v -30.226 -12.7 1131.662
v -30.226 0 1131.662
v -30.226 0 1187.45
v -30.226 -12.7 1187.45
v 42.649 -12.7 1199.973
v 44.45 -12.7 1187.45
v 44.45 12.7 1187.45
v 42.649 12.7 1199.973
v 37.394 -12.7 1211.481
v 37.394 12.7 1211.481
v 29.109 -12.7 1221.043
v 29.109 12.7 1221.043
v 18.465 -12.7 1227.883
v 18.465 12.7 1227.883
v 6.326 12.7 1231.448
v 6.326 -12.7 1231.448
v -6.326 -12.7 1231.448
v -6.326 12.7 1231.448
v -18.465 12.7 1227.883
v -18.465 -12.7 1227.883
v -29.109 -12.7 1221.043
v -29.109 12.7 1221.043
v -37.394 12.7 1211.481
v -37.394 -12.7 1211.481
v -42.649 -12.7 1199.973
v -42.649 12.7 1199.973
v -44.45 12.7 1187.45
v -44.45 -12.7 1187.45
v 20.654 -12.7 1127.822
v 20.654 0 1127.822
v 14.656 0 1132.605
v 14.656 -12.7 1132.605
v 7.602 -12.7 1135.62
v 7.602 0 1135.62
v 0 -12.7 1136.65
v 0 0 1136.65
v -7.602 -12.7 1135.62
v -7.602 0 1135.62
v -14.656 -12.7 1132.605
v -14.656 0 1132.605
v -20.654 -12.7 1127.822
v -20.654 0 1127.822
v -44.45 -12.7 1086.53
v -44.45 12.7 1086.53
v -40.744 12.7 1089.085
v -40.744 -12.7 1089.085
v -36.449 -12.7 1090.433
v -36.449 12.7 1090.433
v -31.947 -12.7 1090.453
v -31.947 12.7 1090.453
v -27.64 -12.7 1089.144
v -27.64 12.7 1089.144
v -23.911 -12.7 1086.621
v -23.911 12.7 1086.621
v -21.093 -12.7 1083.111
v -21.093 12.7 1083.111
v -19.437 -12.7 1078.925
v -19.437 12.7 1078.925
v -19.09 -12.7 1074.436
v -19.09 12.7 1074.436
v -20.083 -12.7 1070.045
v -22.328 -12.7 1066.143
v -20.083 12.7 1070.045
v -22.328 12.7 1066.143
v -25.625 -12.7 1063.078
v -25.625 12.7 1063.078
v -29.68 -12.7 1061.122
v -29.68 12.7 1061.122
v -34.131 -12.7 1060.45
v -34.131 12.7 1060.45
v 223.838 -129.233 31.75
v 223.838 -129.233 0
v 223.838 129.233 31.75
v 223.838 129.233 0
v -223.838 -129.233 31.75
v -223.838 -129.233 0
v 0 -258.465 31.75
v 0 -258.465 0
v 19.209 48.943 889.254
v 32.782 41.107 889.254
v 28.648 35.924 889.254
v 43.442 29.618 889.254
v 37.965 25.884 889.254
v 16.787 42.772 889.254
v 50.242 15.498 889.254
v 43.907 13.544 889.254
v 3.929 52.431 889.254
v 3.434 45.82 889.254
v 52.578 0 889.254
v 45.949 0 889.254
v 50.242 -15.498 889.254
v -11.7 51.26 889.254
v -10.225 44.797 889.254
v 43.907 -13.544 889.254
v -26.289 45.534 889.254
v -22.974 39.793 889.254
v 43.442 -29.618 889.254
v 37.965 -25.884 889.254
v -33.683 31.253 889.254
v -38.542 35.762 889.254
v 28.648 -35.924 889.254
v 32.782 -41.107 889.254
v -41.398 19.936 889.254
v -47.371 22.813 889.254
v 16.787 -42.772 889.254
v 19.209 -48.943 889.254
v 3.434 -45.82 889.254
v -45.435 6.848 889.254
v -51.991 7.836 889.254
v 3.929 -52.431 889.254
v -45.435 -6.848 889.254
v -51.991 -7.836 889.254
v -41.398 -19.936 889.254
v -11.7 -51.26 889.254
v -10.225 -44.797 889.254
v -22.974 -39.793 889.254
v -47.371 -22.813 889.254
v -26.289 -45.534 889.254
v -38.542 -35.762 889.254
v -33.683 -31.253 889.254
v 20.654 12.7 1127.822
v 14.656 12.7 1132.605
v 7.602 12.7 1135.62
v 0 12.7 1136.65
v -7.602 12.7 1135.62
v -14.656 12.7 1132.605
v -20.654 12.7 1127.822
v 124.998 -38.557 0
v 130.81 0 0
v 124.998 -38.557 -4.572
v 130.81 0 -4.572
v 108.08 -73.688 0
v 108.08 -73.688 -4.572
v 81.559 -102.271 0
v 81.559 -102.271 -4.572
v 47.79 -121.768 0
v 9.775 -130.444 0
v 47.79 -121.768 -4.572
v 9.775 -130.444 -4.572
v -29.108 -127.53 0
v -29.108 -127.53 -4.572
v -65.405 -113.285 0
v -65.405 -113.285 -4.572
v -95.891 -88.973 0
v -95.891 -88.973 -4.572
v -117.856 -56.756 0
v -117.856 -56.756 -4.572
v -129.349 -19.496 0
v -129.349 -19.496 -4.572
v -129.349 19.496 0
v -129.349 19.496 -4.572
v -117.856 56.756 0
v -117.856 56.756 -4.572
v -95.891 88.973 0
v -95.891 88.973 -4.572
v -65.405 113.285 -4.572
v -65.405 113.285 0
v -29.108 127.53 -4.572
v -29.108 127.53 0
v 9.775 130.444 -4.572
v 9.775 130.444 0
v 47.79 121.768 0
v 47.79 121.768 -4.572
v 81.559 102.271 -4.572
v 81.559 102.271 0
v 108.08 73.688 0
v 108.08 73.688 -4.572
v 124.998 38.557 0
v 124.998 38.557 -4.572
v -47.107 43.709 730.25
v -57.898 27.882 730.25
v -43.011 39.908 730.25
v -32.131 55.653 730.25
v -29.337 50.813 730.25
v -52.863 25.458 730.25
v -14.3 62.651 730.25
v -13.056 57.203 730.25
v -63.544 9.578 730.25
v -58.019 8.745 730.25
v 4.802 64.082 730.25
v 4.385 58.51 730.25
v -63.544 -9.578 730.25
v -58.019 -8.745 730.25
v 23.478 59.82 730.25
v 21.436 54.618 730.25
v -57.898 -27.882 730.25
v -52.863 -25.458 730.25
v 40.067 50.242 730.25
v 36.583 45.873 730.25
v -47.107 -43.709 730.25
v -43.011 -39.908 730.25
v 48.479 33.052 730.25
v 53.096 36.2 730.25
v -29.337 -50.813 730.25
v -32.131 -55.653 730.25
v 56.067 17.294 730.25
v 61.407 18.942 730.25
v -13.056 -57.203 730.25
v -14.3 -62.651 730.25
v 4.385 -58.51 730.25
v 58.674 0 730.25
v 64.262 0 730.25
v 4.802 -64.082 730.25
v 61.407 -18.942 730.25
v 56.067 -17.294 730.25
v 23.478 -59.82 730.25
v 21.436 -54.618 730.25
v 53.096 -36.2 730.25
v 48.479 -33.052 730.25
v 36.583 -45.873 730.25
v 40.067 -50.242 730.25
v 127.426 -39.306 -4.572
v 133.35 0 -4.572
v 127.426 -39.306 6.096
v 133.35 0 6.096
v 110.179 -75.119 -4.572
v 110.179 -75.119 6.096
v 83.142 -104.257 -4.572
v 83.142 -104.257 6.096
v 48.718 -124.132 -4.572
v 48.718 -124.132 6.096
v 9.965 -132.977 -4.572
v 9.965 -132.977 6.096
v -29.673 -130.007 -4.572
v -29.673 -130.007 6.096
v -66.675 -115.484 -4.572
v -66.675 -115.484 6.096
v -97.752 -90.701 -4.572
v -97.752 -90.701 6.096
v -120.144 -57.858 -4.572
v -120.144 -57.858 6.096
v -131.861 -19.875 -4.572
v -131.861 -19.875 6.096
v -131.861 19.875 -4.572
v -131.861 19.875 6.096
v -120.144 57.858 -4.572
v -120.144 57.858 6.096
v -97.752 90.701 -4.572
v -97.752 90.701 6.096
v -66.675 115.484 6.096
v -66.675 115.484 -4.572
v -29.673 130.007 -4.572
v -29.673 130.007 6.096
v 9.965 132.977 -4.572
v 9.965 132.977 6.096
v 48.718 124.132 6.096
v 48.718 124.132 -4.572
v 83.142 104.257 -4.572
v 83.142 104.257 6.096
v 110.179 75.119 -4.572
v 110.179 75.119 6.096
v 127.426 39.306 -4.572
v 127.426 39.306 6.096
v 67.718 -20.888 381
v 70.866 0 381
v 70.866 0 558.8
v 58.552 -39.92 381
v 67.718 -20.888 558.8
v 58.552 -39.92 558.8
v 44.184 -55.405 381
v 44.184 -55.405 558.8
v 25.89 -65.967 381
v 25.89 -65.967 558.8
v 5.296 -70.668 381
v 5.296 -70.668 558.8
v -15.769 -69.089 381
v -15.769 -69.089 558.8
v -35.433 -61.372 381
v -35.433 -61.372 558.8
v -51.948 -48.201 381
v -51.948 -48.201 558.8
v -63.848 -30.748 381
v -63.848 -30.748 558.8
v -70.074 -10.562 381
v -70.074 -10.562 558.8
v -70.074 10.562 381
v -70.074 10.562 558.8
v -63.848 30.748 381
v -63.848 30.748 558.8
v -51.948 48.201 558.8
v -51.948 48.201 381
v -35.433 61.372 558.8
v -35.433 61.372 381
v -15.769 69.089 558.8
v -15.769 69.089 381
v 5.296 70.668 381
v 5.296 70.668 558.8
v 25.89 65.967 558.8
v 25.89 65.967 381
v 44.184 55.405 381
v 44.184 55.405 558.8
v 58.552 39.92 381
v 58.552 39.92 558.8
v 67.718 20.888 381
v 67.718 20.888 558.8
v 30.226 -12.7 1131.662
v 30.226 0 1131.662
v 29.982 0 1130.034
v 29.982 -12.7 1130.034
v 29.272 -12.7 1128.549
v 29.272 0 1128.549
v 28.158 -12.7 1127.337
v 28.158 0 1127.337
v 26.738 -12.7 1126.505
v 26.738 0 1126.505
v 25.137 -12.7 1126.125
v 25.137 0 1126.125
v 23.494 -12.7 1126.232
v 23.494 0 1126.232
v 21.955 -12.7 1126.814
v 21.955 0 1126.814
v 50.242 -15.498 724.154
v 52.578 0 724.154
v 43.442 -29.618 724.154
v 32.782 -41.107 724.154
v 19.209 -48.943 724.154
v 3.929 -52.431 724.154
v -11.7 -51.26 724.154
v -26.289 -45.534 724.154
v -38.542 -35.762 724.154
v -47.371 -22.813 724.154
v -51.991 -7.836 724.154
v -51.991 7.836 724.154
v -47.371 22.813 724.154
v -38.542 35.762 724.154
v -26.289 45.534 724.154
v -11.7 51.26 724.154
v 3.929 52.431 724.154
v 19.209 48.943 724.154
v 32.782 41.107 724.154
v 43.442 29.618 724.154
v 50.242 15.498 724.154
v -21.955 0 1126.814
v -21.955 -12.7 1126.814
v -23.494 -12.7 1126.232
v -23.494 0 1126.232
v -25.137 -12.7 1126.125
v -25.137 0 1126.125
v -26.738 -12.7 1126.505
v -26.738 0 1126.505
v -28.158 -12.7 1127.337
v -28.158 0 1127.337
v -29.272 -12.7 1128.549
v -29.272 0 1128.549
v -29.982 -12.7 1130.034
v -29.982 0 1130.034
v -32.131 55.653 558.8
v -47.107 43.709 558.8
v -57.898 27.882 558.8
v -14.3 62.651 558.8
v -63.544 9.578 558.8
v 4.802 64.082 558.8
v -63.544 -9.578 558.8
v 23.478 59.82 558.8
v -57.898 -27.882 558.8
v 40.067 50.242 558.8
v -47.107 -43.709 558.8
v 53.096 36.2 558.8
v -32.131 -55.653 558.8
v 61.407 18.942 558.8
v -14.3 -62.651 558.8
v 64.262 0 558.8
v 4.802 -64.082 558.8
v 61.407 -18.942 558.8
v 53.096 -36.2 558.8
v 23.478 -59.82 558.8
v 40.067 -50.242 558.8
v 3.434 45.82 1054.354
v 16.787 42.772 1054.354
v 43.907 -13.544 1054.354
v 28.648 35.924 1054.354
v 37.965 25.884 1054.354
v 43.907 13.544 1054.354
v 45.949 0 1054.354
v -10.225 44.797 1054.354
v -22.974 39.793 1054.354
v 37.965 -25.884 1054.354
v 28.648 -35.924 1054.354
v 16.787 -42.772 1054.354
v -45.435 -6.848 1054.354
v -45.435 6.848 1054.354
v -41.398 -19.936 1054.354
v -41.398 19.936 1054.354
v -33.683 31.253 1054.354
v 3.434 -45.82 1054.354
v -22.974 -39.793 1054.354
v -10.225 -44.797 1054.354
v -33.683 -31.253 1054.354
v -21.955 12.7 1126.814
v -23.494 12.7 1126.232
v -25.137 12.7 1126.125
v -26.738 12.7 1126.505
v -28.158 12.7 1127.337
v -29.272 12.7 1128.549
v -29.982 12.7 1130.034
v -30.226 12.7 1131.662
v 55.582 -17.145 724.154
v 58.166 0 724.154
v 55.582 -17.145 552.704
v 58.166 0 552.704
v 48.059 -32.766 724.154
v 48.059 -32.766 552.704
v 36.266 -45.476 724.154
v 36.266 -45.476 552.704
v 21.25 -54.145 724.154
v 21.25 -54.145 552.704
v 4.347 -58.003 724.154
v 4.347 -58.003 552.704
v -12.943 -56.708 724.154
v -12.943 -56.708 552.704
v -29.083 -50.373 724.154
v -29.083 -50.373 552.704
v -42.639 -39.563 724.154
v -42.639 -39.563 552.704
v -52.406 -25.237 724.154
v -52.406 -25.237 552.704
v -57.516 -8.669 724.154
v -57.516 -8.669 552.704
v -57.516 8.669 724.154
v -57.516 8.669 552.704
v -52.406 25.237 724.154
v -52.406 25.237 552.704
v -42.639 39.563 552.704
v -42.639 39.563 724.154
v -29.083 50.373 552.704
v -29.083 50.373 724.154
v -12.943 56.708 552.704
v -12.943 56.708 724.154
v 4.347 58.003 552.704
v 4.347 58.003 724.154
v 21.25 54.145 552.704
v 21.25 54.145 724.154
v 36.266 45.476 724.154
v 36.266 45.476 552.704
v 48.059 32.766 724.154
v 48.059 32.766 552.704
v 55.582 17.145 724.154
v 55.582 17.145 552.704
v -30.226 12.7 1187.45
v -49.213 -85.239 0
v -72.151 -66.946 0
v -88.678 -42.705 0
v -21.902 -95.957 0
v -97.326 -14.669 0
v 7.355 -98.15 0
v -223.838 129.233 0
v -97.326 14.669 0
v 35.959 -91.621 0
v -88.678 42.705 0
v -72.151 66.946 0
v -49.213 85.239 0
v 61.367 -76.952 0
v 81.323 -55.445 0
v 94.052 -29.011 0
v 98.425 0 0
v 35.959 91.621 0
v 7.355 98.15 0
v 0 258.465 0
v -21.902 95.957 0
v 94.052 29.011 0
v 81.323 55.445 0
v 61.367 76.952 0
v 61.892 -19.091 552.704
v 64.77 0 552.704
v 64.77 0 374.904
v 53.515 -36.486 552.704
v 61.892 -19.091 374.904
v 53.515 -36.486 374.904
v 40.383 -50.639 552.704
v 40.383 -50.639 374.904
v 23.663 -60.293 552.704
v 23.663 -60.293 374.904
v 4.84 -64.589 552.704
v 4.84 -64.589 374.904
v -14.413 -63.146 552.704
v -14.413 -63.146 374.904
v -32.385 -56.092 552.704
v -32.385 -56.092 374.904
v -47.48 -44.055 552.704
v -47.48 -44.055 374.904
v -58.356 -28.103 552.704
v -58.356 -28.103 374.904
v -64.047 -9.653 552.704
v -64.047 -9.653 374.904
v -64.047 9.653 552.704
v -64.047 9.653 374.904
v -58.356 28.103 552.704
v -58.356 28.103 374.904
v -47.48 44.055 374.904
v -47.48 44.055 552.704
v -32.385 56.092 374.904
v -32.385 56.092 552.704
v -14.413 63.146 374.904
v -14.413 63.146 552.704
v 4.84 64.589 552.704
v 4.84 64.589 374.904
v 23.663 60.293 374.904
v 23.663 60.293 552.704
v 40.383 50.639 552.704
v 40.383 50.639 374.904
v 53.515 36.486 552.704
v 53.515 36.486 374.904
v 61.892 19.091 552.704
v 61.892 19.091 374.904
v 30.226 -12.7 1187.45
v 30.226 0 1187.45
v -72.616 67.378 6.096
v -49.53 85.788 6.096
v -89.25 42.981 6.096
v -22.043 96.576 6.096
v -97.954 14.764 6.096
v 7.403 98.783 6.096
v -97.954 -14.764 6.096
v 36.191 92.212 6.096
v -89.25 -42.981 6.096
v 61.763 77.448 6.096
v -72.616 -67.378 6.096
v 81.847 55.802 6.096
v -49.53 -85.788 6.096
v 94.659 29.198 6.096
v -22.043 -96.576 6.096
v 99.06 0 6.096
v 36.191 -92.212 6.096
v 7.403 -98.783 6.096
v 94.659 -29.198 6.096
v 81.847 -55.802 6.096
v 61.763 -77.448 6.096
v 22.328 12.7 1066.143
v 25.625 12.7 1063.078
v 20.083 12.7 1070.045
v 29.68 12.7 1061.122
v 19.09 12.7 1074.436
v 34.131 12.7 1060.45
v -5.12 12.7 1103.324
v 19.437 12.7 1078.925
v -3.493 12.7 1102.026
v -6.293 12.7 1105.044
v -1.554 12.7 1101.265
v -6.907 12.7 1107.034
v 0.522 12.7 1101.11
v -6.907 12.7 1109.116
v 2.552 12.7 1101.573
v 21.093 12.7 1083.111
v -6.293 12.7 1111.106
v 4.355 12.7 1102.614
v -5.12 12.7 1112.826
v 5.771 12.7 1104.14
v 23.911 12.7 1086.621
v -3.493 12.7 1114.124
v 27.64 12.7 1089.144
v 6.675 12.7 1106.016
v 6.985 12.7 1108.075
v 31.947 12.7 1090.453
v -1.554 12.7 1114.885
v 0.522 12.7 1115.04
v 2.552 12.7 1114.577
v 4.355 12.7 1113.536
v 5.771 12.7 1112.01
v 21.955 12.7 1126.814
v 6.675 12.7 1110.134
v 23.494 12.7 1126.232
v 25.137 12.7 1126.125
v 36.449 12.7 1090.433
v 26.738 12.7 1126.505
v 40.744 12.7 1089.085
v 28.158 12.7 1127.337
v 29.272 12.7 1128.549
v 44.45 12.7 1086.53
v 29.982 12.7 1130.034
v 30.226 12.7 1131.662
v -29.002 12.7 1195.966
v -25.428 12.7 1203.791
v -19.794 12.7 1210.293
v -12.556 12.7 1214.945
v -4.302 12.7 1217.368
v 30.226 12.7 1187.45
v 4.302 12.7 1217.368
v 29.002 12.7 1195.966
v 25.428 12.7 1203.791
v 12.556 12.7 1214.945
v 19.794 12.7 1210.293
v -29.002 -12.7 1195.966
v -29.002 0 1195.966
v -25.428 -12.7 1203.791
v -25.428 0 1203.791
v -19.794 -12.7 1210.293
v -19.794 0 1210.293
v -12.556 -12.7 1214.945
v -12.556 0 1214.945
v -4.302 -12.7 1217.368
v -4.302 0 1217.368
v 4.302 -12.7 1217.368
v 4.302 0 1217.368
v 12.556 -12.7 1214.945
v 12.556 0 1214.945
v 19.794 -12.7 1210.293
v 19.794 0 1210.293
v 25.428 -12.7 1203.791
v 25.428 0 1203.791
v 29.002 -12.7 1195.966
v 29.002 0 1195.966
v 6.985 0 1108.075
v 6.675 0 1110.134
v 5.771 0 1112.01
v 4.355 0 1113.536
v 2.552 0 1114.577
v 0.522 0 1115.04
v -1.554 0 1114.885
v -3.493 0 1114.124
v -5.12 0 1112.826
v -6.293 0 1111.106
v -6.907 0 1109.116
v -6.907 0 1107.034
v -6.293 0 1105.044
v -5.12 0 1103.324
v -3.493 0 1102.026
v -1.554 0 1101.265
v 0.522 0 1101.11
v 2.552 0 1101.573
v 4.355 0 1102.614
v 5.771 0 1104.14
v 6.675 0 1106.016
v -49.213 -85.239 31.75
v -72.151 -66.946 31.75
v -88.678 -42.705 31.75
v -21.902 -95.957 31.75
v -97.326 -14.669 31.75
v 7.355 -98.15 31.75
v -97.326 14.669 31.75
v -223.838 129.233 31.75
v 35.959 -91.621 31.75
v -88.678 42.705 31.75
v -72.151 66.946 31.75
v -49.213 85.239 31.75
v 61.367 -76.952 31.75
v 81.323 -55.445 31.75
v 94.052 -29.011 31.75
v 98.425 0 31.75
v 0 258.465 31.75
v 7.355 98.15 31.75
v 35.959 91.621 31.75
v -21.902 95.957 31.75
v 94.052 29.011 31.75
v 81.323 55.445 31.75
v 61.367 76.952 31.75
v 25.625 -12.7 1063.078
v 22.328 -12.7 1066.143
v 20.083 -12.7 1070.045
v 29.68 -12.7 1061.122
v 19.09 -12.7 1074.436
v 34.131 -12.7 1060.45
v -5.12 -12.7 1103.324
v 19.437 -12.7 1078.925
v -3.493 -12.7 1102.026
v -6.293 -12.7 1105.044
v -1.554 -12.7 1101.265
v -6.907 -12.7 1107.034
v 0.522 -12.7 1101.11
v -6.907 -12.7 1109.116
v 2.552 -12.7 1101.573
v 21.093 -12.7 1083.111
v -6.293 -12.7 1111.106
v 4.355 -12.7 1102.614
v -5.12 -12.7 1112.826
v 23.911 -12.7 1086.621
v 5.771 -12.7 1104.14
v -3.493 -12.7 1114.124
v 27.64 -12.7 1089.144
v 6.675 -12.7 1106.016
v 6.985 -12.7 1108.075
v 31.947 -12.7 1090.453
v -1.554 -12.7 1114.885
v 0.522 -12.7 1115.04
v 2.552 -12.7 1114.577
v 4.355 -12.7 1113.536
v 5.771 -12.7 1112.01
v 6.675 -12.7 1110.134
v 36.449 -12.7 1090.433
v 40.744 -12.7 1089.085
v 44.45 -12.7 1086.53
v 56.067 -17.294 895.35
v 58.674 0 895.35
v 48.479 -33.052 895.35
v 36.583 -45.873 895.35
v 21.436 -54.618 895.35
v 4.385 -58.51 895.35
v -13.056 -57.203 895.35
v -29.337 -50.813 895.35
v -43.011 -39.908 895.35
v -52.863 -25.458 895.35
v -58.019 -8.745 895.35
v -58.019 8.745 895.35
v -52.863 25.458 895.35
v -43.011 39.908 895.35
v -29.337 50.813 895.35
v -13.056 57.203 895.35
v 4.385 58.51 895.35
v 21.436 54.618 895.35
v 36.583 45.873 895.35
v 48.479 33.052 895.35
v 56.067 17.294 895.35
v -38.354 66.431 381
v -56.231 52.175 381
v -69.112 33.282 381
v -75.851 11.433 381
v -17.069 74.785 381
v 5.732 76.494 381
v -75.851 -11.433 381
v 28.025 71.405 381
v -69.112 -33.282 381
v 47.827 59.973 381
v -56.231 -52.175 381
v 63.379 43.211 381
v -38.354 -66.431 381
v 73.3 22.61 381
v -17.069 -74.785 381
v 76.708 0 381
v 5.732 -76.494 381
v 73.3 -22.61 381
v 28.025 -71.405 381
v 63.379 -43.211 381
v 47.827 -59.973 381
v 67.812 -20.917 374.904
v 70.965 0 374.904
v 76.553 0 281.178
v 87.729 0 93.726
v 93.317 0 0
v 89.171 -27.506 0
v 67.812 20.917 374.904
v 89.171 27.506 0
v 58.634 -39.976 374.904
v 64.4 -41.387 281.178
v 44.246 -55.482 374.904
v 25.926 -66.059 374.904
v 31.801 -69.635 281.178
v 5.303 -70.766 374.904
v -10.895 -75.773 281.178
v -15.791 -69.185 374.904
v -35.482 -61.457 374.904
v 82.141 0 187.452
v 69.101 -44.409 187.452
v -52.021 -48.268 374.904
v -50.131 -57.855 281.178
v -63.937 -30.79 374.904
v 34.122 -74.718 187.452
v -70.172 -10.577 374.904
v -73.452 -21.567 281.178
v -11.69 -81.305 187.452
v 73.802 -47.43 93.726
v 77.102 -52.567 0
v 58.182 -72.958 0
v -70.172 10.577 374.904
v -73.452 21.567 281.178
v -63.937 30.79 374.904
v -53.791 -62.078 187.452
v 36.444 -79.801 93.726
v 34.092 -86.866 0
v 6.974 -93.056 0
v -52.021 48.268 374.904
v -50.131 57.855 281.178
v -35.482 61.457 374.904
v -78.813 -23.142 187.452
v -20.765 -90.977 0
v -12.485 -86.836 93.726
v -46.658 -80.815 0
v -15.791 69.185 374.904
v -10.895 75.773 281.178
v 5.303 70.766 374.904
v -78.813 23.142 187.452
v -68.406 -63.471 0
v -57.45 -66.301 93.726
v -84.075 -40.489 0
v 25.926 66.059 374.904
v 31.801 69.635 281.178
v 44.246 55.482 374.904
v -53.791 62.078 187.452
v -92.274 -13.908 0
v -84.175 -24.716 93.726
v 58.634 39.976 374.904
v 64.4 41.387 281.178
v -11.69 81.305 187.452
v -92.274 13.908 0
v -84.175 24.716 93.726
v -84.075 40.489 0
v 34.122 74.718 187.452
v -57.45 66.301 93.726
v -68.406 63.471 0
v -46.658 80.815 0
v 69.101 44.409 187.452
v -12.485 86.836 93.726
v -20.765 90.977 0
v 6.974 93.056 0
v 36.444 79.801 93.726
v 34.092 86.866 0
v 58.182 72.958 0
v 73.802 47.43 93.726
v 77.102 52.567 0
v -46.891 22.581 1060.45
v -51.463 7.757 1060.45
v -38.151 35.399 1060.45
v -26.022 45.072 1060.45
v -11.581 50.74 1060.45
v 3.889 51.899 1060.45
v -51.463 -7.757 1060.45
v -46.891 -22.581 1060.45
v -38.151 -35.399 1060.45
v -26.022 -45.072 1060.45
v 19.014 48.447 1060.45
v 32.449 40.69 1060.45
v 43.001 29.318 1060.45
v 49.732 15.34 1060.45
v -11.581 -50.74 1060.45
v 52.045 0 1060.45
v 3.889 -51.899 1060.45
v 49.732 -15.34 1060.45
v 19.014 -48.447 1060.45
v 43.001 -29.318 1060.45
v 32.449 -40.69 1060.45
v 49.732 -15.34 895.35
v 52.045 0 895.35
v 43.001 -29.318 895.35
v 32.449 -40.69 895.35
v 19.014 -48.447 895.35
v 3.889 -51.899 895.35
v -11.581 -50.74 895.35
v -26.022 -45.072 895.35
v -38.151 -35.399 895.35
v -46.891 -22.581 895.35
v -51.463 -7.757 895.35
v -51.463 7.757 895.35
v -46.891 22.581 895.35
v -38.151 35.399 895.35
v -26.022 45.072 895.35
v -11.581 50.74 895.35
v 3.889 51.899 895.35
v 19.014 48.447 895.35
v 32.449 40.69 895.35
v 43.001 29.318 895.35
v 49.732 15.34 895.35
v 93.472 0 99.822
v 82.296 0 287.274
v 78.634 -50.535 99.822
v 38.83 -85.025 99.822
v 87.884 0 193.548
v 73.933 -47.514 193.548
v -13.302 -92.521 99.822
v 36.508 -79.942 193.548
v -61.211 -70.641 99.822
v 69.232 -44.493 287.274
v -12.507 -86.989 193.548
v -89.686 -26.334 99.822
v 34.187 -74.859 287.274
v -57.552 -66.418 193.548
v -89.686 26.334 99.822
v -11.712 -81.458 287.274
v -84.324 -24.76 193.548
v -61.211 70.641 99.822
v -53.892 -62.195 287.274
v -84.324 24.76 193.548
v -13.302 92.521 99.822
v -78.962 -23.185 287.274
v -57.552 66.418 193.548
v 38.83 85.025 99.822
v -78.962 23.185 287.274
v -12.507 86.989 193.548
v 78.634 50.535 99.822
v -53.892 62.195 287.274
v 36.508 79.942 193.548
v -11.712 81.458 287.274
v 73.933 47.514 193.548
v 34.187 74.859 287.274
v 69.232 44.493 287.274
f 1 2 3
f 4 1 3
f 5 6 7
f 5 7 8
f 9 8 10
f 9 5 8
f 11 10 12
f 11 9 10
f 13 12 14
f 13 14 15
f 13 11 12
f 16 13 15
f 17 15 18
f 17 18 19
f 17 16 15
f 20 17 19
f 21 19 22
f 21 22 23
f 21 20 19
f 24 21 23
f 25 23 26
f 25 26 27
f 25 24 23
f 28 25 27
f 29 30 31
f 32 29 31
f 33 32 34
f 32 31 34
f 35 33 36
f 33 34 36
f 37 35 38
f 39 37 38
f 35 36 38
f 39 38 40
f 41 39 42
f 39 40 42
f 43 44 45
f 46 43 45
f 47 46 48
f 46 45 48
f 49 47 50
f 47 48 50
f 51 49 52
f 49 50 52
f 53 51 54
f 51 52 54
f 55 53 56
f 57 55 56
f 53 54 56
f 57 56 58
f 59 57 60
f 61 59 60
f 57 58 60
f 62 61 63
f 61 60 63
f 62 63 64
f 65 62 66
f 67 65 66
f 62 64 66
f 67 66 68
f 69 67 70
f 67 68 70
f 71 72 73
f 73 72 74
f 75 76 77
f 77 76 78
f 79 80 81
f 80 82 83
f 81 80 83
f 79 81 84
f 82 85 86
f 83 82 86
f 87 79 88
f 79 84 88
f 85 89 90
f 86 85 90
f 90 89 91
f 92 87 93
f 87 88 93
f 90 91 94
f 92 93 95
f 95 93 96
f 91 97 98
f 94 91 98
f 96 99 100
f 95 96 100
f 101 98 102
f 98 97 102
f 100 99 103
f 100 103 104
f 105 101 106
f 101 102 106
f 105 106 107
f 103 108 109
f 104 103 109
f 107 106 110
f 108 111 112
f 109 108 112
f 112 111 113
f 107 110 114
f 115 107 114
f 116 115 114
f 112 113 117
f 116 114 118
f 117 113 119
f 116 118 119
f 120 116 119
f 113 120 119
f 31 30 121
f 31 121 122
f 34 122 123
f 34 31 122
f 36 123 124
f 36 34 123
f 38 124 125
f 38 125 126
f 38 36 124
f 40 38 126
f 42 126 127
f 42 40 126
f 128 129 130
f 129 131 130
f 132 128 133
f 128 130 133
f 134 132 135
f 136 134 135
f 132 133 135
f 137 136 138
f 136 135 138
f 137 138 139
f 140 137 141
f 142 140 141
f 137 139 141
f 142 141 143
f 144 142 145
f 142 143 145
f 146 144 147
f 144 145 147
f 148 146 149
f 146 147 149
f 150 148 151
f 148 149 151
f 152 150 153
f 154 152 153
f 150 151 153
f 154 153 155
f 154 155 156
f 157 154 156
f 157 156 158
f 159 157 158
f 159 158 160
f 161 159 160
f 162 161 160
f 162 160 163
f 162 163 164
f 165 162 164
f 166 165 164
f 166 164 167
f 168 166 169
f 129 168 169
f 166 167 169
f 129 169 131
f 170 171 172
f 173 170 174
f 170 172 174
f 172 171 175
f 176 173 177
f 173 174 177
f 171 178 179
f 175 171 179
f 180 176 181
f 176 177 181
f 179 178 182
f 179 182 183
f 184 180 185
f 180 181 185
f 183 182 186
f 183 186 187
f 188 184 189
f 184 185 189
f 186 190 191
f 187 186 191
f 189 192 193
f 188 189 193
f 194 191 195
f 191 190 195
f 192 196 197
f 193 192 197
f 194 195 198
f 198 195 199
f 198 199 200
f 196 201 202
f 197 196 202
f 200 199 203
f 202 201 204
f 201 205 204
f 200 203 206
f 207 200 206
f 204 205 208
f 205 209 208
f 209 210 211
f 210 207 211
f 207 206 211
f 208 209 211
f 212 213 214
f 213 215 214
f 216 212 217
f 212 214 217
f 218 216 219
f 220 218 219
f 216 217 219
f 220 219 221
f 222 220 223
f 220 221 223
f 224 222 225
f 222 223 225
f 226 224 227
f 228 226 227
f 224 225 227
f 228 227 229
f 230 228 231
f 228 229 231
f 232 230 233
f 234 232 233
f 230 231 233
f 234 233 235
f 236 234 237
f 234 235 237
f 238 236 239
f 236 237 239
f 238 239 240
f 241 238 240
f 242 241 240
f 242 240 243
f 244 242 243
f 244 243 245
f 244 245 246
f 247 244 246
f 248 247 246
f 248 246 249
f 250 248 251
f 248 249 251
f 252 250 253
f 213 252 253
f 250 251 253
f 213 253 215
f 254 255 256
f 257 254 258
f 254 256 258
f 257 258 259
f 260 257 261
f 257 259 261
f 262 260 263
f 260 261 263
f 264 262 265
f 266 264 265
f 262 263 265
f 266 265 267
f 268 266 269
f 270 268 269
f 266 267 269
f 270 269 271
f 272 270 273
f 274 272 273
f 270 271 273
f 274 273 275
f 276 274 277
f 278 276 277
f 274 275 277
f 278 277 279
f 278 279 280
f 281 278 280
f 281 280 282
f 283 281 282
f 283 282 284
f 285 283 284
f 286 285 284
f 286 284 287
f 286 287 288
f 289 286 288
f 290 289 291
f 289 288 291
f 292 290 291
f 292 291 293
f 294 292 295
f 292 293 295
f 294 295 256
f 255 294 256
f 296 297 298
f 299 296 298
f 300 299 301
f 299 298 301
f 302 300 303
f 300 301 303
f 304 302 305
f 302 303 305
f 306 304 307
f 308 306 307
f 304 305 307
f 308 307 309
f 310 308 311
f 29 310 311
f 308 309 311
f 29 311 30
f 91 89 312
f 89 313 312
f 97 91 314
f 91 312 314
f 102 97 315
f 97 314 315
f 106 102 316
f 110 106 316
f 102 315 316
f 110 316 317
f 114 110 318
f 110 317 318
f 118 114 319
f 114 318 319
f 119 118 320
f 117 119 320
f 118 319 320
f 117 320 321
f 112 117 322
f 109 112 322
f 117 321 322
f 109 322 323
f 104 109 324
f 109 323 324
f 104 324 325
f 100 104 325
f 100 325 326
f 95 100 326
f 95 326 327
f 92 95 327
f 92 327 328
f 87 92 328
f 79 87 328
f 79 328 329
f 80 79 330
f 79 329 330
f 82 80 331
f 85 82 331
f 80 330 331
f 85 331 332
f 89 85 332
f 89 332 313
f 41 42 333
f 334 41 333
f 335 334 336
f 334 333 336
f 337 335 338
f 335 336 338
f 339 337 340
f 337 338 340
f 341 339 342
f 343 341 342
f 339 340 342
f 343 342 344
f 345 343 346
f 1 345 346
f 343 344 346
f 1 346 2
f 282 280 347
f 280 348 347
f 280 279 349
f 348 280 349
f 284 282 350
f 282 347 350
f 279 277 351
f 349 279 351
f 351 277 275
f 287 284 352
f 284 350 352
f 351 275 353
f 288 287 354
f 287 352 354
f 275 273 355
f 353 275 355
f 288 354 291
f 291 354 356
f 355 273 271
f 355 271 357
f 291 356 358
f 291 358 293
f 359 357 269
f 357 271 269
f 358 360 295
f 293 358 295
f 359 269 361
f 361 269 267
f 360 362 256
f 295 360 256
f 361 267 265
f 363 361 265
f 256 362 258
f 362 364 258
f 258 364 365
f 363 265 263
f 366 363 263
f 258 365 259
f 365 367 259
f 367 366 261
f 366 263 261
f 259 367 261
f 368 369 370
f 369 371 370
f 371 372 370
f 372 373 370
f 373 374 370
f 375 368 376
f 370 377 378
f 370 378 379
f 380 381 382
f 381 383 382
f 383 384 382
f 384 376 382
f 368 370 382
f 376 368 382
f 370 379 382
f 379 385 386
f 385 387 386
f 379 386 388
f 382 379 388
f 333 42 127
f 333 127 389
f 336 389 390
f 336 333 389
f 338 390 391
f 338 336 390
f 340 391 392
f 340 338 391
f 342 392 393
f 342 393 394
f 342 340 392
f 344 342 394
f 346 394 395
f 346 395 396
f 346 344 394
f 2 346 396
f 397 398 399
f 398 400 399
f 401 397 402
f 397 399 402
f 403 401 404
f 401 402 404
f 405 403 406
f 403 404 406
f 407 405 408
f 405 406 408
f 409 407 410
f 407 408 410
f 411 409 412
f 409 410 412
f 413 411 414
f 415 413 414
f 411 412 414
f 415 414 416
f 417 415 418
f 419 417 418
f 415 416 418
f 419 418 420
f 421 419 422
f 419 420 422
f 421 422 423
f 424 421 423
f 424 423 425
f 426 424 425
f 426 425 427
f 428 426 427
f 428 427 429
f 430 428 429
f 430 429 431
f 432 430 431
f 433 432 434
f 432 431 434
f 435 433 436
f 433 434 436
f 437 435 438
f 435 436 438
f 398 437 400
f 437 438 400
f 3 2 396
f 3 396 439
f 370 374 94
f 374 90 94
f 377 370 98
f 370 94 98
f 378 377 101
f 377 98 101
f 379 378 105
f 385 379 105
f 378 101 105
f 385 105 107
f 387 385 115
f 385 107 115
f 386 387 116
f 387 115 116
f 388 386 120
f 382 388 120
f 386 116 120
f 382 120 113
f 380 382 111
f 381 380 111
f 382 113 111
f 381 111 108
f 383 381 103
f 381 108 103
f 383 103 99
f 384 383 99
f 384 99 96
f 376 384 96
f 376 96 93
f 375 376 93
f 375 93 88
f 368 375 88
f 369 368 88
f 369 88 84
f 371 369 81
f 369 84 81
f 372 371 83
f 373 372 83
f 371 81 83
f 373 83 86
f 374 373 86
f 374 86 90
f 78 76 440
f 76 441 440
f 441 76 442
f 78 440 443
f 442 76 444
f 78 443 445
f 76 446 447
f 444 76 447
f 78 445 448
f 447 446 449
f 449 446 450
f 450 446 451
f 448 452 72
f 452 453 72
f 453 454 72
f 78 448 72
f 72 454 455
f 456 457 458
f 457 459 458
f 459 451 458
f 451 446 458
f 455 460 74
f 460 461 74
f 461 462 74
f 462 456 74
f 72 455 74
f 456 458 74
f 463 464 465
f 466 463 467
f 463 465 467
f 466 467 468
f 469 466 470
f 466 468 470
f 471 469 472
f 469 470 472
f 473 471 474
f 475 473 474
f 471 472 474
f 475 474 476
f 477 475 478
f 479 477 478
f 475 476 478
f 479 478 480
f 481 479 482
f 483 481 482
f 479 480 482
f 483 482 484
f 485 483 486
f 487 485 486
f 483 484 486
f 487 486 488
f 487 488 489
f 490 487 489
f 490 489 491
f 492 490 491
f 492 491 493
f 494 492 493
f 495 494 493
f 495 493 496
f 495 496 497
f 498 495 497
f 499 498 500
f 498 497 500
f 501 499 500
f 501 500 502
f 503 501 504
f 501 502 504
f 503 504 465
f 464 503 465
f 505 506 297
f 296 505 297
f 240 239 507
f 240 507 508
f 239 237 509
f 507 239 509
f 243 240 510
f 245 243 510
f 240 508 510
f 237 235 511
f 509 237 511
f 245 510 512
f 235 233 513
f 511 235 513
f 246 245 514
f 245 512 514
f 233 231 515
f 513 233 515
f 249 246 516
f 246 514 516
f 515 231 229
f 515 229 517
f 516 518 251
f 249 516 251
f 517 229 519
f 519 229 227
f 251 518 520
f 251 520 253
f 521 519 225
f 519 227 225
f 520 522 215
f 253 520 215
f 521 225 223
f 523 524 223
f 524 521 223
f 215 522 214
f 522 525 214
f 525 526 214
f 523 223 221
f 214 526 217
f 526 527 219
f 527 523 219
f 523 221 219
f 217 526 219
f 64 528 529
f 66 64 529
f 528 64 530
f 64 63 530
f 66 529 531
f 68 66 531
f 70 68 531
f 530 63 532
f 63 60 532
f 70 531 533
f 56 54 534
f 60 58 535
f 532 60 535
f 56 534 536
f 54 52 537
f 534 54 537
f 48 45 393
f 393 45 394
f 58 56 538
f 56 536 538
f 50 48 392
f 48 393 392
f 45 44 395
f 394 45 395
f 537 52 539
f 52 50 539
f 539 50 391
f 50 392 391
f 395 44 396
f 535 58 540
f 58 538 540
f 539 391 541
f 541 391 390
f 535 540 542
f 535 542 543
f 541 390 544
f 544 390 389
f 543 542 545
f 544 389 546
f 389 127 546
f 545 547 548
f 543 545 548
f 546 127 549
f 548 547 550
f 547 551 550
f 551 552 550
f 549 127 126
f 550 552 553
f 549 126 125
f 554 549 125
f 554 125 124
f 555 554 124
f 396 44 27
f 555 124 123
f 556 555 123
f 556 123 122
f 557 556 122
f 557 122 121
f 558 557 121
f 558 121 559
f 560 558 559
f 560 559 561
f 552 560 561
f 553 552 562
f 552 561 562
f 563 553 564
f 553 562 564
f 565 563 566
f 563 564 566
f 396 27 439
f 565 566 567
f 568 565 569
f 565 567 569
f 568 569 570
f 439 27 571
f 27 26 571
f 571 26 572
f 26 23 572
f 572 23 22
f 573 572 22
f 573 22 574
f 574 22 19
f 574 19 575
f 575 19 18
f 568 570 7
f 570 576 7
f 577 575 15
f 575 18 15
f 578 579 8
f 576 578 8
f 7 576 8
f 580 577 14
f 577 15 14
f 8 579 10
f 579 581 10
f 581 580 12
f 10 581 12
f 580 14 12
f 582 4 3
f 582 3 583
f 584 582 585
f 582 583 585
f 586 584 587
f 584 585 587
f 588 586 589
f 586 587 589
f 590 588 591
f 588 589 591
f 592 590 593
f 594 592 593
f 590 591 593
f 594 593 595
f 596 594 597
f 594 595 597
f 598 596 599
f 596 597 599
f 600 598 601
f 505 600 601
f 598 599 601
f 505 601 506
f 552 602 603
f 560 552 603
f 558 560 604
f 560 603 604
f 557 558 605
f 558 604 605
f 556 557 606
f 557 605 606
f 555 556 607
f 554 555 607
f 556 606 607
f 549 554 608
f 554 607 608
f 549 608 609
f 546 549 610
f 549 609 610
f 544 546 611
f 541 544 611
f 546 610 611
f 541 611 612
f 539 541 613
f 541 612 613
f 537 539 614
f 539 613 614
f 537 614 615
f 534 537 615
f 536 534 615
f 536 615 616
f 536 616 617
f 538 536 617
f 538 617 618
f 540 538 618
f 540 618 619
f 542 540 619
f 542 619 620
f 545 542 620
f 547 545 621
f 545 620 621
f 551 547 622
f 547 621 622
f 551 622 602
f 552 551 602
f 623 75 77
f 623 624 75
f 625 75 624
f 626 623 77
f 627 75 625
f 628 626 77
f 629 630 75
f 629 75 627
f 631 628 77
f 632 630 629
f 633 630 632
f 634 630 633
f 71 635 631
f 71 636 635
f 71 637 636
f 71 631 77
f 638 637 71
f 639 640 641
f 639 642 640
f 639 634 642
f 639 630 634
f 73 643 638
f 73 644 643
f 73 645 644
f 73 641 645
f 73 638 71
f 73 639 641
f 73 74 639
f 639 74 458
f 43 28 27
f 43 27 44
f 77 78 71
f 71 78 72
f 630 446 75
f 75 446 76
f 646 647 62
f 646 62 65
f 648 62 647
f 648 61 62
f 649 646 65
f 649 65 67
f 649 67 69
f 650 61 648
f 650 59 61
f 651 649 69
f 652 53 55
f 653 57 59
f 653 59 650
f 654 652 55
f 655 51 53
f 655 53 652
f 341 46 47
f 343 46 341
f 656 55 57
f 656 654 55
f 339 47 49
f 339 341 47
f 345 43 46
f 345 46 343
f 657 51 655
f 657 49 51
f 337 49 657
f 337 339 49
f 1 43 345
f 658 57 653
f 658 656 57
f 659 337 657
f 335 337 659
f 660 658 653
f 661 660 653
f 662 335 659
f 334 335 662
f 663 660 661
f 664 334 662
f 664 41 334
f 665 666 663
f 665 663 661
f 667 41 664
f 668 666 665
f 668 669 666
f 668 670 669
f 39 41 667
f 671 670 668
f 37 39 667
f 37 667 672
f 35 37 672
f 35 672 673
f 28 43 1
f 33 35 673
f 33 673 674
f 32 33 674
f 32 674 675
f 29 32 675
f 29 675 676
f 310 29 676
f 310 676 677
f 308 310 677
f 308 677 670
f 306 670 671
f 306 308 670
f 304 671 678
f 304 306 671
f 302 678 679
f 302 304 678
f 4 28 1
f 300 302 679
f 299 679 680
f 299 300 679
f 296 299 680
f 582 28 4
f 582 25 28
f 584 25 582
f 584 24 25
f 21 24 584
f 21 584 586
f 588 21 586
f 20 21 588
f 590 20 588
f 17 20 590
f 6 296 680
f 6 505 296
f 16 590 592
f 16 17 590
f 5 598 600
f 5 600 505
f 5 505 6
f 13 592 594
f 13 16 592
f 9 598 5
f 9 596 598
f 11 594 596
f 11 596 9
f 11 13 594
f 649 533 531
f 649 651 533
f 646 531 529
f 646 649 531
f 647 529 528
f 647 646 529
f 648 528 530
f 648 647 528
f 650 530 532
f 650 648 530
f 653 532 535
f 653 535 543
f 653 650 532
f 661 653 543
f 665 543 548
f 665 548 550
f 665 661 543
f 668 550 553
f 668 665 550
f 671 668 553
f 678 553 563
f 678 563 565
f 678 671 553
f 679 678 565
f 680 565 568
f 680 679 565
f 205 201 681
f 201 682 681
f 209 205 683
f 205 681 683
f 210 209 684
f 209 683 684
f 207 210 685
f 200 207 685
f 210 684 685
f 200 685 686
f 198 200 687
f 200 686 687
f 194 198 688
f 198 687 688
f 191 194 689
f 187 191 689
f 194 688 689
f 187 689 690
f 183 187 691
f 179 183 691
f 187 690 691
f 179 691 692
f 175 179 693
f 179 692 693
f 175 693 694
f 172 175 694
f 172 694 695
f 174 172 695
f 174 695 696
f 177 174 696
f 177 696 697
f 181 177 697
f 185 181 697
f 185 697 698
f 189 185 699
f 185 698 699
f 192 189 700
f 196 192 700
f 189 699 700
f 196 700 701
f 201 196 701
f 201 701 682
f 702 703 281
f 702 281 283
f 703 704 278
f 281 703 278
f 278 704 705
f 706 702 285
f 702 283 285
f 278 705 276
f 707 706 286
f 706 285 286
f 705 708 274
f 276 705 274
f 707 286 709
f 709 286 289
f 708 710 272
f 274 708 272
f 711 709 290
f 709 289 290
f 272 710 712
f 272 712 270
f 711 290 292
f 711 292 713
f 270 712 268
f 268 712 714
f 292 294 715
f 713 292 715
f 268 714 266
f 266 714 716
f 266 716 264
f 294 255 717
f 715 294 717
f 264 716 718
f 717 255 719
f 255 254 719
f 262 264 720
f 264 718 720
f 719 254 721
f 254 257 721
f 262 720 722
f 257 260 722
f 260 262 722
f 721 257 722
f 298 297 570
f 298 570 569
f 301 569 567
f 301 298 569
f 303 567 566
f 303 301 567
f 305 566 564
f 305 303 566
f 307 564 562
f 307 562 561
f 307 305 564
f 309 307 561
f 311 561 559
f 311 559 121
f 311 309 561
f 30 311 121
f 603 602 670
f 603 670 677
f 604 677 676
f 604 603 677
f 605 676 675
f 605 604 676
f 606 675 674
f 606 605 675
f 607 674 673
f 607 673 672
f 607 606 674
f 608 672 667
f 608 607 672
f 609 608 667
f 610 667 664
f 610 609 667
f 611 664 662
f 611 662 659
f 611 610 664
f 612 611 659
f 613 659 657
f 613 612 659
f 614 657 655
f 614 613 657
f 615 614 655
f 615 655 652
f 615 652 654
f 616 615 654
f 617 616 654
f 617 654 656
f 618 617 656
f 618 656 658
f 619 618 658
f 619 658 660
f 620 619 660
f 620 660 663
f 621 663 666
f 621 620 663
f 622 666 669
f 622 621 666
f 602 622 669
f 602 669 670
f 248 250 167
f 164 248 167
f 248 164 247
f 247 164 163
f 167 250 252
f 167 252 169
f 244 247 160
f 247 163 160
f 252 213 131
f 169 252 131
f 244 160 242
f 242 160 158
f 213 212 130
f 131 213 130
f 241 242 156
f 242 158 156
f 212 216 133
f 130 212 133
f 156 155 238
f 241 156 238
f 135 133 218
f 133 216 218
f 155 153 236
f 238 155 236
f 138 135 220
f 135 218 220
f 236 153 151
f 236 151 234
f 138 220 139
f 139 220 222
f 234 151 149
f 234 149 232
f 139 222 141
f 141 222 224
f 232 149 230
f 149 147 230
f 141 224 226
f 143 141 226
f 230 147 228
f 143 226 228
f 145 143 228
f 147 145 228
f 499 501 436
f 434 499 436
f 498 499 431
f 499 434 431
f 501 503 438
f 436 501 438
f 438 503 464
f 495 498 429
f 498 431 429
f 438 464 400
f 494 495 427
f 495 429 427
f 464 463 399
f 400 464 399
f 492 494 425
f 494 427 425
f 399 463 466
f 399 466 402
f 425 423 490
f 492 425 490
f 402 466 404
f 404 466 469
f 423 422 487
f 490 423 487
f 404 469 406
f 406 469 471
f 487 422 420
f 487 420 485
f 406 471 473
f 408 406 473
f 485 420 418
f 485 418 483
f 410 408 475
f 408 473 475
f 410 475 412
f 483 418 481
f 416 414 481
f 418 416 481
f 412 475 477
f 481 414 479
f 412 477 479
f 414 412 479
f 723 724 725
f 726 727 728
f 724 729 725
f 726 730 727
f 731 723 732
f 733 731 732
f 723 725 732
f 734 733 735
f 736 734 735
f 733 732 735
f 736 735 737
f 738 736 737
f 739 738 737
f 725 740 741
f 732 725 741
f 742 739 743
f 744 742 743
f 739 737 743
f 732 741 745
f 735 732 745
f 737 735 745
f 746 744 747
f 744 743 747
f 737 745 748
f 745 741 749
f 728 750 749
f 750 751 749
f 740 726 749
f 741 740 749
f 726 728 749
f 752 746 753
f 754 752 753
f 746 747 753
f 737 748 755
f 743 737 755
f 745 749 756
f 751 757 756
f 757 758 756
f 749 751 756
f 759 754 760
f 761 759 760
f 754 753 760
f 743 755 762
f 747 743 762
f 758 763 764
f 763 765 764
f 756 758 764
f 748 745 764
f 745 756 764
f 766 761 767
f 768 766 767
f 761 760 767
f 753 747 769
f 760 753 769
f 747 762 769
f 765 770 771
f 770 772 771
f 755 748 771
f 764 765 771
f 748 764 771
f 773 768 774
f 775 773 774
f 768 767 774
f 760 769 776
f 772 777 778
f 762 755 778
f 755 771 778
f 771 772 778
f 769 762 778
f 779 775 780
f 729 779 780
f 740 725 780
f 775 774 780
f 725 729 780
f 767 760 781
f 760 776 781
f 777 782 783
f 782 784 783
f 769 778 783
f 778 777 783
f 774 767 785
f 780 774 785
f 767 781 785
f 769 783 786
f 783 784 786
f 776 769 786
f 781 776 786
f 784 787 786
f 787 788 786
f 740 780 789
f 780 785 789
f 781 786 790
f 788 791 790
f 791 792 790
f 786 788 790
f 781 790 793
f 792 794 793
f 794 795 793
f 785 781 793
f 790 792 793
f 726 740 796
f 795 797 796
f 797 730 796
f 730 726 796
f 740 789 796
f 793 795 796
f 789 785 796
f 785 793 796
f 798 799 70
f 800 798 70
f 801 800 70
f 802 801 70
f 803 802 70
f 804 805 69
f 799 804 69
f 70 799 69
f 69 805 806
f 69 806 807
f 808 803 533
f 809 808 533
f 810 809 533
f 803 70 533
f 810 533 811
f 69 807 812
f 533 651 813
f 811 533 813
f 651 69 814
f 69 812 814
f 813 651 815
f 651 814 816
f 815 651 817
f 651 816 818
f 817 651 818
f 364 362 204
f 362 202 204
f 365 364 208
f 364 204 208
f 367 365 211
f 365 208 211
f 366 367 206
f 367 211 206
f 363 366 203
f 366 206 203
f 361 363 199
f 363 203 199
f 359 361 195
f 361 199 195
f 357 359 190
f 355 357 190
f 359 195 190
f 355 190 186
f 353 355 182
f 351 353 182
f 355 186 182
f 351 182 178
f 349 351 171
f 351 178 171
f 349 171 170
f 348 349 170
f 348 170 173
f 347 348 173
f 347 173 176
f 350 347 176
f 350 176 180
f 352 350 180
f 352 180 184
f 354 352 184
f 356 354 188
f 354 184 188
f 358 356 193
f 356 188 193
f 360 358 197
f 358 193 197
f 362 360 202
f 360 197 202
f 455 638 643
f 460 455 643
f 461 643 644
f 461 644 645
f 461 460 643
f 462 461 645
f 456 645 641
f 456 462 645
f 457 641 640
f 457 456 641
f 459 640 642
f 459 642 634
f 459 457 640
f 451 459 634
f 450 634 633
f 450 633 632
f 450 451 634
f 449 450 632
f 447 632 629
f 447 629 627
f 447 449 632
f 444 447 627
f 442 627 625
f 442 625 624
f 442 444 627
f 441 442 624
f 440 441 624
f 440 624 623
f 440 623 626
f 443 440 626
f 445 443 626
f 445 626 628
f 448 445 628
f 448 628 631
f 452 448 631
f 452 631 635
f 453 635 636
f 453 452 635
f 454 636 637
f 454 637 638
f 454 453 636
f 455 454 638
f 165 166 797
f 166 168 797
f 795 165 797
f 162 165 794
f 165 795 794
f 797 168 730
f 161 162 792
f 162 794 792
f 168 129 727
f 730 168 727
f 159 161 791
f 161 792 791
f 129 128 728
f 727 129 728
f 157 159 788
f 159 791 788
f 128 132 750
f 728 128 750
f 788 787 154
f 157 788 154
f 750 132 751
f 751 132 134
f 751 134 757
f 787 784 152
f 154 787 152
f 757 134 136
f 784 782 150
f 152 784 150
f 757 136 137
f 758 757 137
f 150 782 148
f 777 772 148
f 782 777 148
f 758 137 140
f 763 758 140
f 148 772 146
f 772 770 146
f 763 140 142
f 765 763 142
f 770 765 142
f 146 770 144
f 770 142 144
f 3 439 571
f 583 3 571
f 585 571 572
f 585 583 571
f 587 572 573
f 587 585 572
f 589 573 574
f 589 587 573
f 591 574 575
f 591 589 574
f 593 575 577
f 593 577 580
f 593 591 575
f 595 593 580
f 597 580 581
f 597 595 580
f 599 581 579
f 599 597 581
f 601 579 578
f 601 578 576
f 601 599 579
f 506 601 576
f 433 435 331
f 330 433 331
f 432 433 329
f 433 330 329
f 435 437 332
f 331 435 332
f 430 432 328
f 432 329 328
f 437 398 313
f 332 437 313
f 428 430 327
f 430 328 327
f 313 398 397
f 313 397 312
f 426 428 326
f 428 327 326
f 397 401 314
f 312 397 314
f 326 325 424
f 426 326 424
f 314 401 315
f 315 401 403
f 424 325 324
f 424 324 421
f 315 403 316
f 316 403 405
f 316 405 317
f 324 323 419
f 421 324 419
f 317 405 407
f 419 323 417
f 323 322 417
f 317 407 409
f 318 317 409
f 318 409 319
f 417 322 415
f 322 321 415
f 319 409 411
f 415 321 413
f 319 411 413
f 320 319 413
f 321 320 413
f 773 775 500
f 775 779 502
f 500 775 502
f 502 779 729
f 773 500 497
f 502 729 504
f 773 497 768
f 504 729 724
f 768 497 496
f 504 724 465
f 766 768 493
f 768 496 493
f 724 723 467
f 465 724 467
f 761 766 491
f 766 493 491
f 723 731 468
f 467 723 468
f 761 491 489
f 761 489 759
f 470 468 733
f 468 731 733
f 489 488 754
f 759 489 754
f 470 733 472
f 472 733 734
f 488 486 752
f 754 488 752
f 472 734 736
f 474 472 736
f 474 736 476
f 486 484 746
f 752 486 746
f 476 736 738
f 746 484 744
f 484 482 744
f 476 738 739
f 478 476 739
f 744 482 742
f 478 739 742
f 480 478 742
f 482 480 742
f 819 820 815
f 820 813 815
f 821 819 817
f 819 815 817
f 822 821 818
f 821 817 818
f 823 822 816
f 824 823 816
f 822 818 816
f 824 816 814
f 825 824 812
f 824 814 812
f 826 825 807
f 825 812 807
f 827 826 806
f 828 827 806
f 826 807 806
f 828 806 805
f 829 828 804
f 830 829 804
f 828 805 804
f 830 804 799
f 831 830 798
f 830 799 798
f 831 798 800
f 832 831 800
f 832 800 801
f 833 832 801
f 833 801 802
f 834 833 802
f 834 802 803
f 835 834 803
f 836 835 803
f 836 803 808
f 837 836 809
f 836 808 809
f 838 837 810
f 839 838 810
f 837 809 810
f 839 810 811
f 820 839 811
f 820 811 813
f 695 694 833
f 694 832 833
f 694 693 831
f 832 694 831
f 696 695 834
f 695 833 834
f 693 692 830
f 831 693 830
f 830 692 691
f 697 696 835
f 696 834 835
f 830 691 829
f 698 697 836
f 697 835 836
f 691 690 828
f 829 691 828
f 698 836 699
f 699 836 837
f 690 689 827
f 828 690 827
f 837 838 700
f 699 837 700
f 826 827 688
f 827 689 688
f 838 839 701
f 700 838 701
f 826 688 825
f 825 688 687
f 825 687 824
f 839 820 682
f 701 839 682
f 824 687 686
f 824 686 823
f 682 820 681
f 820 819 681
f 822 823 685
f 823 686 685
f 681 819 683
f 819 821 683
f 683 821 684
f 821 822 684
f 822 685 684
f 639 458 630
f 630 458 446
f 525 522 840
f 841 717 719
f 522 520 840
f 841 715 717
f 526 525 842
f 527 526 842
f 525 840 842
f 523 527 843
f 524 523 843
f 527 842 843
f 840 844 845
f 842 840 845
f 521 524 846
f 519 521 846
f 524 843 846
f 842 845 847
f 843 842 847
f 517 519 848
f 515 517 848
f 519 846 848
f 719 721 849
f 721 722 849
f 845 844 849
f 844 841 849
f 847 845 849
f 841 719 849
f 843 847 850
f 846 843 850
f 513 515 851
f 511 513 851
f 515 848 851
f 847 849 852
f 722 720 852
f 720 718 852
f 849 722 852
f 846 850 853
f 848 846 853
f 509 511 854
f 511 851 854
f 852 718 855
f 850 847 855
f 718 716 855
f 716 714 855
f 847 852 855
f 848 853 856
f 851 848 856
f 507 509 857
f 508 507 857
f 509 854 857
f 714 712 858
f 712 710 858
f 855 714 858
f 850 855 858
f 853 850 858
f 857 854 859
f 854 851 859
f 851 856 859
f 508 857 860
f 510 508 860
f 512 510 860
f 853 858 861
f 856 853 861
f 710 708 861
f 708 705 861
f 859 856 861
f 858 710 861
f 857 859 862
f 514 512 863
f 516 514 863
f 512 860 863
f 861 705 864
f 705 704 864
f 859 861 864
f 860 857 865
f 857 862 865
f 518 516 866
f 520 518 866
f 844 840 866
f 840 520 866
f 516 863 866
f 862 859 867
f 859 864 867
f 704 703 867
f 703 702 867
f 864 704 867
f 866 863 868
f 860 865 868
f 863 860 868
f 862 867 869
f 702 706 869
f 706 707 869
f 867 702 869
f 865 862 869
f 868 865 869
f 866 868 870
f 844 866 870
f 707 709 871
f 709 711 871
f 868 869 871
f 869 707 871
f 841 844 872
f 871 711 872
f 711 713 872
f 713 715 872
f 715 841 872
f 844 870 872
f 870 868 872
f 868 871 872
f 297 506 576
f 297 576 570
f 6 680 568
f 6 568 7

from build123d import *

# Parameters (mm, degrees)
F0_R          = 6.985
F2_DEPTH      = 12.7
F2_DEPTH_BACK = 12.7
F3_R          = 98.425
F4_DEPTH      = 31.75


with BuildPart() as f1:
    # F0 (on Front) → F1 (revolve)
    with BuildSketch(Plane.XZ):
        Polygon((133.35, -4.572), (133.35, 6.096), (99.06, 6.096), (76.708, 381), (70.866, 381), (70.866, 558.8), (64.262, 558.8), (64.262, 730.25), (58.674, 730.25), (58.674, 895.35), (52.0446, 895.35), (52.0446, 1060.45), (44.45, 1060.45), (34.13125, 1060.45), (0, 1060.45), (0, 1054.354), (45.9486, 1054.354), (45.9486, 889.254), (52.578, 889.254), (52.578, 724.154), (58.166, 724.154), (58.166, 552.704), (64.77, 552.704), (64.77, 374.904), (70.964622, 374.904), (93.316622, 0), (130.81, 0), (130.81, -4.572), align=None)
    revolve(axis=Axis((0, 0, 1057.402), (0, 0, -1)))

    # F0 (on Front) → F2 (join, two sides)
    with BuildSketch(Plane.XZ) as f2_sk:
        with BuildLine():
            Line((0, 1060.45), (34.13125, 1060.45))
            ThreePointArc((34.13125, 1060.45), (20.107777, 1081.079792), (44.45, 1086.529773))
            Line((44.45, 1086.529773), (44.45, 1187.45))
            ThreePointArc((44.45, 1187.45), (0, 1231.9), (-44.45, 1187.45))
            Line((-44.45, 1187.45), (-44.45, 1086.529773))
            ThreePointArc((-44.45, 1086.529773), (-20.107777, 1081.079792), (-34.13125, 1060.45))
            Line((-34.13125, 1060.45), (0, 1060.45))
        make_face()
        with Locations((0, 1108.075)):
            Circle(F0_R, mode=Mode.SUBTRACT)
        with BuildLine():
            ThreePointArc((-30.226, 1187.45), (0, 1217.676), (30.226, 1187.45))
            Line((30.226, 1187.45), (30.226, 1131.661981))
            ThreePointArc((30.226, 1131.661981), (26.738322, 1126.505148), (20.653744, 1127.82224))
            ThreePointArc((20.653744, 1127.82224), (0, 1136.65), (-20.653744, 1127.82224))
            ThreePointArc((-20.653744, 1127.82224), (-26.738322, 1126.505148), (-30.226, 1131.661981))
            Line((-30.226, 1131.661981), (-30.226, 1187.45))
        make_face(mode=Mode.SUBTRACT)
    extrude(amount=F2_DEPTH)
    extrude(f2_sk.sketch, amount=-F2_DEPTH_BACK)


with BuildPart() as f4:
    # F3 (on Top) → F4 (new body)
    with BuildSketch(Plane.XY):
        Polygon((223.8375, -129.232641), (223.8375, 129.232641), (0, 258.465282), (-223.8375, 129.232641), (-223.8375, -129.232641), (0, -258.465282), align=None)
        Circle(F3_R, mode=Mode.SUBTRACT)
    extrude(amount=F4_DEPTH)


solid = Compound([f1.part, f4.part])
